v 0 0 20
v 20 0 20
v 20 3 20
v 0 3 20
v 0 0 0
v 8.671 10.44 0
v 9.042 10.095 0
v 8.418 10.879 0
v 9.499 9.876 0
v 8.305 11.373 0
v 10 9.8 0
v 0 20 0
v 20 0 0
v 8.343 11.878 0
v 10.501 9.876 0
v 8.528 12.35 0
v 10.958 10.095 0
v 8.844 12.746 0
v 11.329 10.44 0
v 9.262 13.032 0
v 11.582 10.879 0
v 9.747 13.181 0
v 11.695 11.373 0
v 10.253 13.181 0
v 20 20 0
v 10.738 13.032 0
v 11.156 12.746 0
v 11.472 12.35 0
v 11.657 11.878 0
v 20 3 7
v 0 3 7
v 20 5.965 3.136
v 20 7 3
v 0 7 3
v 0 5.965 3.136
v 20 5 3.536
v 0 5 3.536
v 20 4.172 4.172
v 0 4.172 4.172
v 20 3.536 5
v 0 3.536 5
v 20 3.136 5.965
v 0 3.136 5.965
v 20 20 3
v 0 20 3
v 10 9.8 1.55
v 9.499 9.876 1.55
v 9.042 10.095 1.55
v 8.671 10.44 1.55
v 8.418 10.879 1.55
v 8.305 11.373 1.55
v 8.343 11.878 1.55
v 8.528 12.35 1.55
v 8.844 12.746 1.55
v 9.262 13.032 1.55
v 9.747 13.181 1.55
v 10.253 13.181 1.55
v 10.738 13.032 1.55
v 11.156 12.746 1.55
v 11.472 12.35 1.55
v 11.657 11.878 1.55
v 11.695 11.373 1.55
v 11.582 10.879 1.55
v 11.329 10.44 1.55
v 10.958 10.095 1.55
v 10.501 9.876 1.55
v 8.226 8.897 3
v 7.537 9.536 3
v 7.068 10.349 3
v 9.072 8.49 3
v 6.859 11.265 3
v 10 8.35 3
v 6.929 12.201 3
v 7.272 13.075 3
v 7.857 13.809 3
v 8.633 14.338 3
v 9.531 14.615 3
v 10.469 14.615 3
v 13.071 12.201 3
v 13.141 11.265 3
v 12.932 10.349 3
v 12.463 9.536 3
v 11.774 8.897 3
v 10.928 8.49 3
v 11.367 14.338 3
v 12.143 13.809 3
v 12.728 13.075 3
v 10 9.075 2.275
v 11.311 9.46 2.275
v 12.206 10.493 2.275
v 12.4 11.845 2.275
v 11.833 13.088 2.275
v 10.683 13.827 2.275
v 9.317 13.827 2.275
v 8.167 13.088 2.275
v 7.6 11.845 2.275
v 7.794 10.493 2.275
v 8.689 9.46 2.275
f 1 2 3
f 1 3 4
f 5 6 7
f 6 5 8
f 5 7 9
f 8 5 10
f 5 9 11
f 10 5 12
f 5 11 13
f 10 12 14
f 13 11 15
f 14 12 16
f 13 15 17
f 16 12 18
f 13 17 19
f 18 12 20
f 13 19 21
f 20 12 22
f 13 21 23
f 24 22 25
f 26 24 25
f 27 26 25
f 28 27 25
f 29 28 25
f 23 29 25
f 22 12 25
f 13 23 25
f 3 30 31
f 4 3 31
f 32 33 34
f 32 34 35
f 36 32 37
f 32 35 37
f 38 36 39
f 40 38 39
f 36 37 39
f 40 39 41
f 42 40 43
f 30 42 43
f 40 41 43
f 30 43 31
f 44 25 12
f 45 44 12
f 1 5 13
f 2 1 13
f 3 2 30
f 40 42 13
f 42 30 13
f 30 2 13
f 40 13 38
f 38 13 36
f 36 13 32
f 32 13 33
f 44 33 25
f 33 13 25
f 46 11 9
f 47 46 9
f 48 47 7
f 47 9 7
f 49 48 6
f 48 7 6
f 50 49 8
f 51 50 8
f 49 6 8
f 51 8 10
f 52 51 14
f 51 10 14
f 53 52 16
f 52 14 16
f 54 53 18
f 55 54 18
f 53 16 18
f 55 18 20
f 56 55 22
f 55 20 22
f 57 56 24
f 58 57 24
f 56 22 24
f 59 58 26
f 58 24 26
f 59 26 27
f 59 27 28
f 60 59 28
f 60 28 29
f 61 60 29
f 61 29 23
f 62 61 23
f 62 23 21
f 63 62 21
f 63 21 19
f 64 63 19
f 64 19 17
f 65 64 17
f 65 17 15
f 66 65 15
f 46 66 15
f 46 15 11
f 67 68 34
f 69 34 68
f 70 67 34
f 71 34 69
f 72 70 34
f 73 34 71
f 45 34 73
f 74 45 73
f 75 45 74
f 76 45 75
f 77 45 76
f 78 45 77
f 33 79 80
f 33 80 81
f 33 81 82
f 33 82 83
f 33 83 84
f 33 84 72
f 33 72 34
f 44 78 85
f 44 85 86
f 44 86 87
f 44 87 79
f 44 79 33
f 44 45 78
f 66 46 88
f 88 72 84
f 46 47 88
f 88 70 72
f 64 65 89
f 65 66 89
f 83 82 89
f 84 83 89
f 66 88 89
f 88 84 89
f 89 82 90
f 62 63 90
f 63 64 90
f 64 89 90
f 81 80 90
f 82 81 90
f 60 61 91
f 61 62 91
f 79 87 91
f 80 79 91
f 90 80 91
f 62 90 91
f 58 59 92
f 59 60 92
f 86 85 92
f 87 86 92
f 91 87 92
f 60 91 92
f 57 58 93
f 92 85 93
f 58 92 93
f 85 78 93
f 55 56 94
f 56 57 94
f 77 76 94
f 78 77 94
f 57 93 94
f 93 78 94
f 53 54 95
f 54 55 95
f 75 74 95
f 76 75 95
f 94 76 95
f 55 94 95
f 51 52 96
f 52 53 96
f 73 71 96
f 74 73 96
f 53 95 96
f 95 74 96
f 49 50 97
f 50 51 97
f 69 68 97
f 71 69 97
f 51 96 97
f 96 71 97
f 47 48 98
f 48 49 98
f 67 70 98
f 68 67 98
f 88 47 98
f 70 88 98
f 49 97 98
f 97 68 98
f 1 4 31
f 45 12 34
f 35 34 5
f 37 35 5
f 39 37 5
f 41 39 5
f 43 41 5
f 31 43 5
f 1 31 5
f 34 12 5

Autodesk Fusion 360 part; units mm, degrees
sketch "Sketch1" plane through (0, 0, 0) normal (0, 0, 1) x (1, 0, 0)
  line L0 (0, 0) -> (20, 0)
  line L1 (20, 0) -> (20, 20)
  line L2 (20, 20) -> (0, 20)
  line L3 (0, 20) -> (0, 0)
  dimension "d1" = 20
  dimension "d2" = 20
extrude "Extrude1" add sketch "Sketch1" along normal blind 3
sketch "Sketch2" plane through (0, 0, 3) normal (0, 0, 1) x (-1, 0, 0)
  line L0 (0, -20) -> (0, 0)
  line L1 (0, 0) -> (-20, 0)
  line L2 (-20, 0) -> (-20, -20)
  line L3 (-20, -20) -> (0, -20)
  line L4 (0, 0) -> (-20, 0)
  line L5 (-20, 0) -> (-20, -3)
  line L6 (-20, -3) -> (0, -3)
  line L7 (0, -3) -> (0, 0)
  dimension "d5" = 20
  dimension "d6" = 3
extrude "Extrude2" add sketch "Sketch2" along normal blind 17 contours L0 L1 L2 L4 L5 L6 L7
sketch "Sketch3" plane through (0, 0, 3) normal (0, 0, 1) x (-1, 0, 0)
  line L0 (0, -3) -> (-20, -3)
  line L1 (-20, -3) -> (-20, -20)
  line L2 (-20, -20) -> (0, -20)
  line L3 (0, -20) -> (0, -3)
  line L4 (-10, -20) -> (-10, -3) construction
  point P0 (-10, -11.5)
hole "Hole1" at (10, 11.5, 3) direction (0, 0, -1) diameter 3.4 depth 10 tip angle 180 countersink diameter 6.3 countersink angle 90
fillet "Fillet1" radius 4 1 edges at (10, 3, 3)
